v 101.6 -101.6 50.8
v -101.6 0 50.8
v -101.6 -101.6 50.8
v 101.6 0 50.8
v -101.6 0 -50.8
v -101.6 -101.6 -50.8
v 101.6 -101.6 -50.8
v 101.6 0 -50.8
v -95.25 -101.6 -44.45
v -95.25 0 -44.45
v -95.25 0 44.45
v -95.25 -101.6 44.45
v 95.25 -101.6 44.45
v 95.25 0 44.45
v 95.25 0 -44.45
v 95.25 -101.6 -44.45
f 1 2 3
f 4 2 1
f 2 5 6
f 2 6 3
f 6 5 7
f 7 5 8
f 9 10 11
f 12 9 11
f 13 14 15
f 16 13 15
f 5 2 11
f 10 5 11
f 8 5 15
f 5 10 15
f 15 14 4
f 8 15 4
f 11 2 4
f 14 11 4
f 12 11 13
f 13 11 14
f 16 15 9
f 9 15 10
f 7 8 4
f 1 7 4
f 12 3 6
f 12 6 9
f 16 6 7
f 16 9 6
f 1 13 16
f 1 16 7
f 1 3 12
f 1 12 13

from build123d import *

# Parameters (mm, degrees)
F0_W     = 203.2
F0_H     = 101.6
F1_DEPTH = 101.6


with BuildPart() as f1:
    # F0 (on Front) → F1 (new body)
    with BuildSketch(Plane.XZ):
        Rectangle(F0_W, F0_H)
        Polygon((82.55, 44.45), (95.25, 44.45), (95.25, 19.05), (95.25, -44.45), (0, -44.45), (-95.25, -44.45), (-95.25, 44.45), (0, 44.45), align=None, mode=Mode.SUBTRACT)
    extrude(amount=F1_DEPTH)


solid = f1.part
